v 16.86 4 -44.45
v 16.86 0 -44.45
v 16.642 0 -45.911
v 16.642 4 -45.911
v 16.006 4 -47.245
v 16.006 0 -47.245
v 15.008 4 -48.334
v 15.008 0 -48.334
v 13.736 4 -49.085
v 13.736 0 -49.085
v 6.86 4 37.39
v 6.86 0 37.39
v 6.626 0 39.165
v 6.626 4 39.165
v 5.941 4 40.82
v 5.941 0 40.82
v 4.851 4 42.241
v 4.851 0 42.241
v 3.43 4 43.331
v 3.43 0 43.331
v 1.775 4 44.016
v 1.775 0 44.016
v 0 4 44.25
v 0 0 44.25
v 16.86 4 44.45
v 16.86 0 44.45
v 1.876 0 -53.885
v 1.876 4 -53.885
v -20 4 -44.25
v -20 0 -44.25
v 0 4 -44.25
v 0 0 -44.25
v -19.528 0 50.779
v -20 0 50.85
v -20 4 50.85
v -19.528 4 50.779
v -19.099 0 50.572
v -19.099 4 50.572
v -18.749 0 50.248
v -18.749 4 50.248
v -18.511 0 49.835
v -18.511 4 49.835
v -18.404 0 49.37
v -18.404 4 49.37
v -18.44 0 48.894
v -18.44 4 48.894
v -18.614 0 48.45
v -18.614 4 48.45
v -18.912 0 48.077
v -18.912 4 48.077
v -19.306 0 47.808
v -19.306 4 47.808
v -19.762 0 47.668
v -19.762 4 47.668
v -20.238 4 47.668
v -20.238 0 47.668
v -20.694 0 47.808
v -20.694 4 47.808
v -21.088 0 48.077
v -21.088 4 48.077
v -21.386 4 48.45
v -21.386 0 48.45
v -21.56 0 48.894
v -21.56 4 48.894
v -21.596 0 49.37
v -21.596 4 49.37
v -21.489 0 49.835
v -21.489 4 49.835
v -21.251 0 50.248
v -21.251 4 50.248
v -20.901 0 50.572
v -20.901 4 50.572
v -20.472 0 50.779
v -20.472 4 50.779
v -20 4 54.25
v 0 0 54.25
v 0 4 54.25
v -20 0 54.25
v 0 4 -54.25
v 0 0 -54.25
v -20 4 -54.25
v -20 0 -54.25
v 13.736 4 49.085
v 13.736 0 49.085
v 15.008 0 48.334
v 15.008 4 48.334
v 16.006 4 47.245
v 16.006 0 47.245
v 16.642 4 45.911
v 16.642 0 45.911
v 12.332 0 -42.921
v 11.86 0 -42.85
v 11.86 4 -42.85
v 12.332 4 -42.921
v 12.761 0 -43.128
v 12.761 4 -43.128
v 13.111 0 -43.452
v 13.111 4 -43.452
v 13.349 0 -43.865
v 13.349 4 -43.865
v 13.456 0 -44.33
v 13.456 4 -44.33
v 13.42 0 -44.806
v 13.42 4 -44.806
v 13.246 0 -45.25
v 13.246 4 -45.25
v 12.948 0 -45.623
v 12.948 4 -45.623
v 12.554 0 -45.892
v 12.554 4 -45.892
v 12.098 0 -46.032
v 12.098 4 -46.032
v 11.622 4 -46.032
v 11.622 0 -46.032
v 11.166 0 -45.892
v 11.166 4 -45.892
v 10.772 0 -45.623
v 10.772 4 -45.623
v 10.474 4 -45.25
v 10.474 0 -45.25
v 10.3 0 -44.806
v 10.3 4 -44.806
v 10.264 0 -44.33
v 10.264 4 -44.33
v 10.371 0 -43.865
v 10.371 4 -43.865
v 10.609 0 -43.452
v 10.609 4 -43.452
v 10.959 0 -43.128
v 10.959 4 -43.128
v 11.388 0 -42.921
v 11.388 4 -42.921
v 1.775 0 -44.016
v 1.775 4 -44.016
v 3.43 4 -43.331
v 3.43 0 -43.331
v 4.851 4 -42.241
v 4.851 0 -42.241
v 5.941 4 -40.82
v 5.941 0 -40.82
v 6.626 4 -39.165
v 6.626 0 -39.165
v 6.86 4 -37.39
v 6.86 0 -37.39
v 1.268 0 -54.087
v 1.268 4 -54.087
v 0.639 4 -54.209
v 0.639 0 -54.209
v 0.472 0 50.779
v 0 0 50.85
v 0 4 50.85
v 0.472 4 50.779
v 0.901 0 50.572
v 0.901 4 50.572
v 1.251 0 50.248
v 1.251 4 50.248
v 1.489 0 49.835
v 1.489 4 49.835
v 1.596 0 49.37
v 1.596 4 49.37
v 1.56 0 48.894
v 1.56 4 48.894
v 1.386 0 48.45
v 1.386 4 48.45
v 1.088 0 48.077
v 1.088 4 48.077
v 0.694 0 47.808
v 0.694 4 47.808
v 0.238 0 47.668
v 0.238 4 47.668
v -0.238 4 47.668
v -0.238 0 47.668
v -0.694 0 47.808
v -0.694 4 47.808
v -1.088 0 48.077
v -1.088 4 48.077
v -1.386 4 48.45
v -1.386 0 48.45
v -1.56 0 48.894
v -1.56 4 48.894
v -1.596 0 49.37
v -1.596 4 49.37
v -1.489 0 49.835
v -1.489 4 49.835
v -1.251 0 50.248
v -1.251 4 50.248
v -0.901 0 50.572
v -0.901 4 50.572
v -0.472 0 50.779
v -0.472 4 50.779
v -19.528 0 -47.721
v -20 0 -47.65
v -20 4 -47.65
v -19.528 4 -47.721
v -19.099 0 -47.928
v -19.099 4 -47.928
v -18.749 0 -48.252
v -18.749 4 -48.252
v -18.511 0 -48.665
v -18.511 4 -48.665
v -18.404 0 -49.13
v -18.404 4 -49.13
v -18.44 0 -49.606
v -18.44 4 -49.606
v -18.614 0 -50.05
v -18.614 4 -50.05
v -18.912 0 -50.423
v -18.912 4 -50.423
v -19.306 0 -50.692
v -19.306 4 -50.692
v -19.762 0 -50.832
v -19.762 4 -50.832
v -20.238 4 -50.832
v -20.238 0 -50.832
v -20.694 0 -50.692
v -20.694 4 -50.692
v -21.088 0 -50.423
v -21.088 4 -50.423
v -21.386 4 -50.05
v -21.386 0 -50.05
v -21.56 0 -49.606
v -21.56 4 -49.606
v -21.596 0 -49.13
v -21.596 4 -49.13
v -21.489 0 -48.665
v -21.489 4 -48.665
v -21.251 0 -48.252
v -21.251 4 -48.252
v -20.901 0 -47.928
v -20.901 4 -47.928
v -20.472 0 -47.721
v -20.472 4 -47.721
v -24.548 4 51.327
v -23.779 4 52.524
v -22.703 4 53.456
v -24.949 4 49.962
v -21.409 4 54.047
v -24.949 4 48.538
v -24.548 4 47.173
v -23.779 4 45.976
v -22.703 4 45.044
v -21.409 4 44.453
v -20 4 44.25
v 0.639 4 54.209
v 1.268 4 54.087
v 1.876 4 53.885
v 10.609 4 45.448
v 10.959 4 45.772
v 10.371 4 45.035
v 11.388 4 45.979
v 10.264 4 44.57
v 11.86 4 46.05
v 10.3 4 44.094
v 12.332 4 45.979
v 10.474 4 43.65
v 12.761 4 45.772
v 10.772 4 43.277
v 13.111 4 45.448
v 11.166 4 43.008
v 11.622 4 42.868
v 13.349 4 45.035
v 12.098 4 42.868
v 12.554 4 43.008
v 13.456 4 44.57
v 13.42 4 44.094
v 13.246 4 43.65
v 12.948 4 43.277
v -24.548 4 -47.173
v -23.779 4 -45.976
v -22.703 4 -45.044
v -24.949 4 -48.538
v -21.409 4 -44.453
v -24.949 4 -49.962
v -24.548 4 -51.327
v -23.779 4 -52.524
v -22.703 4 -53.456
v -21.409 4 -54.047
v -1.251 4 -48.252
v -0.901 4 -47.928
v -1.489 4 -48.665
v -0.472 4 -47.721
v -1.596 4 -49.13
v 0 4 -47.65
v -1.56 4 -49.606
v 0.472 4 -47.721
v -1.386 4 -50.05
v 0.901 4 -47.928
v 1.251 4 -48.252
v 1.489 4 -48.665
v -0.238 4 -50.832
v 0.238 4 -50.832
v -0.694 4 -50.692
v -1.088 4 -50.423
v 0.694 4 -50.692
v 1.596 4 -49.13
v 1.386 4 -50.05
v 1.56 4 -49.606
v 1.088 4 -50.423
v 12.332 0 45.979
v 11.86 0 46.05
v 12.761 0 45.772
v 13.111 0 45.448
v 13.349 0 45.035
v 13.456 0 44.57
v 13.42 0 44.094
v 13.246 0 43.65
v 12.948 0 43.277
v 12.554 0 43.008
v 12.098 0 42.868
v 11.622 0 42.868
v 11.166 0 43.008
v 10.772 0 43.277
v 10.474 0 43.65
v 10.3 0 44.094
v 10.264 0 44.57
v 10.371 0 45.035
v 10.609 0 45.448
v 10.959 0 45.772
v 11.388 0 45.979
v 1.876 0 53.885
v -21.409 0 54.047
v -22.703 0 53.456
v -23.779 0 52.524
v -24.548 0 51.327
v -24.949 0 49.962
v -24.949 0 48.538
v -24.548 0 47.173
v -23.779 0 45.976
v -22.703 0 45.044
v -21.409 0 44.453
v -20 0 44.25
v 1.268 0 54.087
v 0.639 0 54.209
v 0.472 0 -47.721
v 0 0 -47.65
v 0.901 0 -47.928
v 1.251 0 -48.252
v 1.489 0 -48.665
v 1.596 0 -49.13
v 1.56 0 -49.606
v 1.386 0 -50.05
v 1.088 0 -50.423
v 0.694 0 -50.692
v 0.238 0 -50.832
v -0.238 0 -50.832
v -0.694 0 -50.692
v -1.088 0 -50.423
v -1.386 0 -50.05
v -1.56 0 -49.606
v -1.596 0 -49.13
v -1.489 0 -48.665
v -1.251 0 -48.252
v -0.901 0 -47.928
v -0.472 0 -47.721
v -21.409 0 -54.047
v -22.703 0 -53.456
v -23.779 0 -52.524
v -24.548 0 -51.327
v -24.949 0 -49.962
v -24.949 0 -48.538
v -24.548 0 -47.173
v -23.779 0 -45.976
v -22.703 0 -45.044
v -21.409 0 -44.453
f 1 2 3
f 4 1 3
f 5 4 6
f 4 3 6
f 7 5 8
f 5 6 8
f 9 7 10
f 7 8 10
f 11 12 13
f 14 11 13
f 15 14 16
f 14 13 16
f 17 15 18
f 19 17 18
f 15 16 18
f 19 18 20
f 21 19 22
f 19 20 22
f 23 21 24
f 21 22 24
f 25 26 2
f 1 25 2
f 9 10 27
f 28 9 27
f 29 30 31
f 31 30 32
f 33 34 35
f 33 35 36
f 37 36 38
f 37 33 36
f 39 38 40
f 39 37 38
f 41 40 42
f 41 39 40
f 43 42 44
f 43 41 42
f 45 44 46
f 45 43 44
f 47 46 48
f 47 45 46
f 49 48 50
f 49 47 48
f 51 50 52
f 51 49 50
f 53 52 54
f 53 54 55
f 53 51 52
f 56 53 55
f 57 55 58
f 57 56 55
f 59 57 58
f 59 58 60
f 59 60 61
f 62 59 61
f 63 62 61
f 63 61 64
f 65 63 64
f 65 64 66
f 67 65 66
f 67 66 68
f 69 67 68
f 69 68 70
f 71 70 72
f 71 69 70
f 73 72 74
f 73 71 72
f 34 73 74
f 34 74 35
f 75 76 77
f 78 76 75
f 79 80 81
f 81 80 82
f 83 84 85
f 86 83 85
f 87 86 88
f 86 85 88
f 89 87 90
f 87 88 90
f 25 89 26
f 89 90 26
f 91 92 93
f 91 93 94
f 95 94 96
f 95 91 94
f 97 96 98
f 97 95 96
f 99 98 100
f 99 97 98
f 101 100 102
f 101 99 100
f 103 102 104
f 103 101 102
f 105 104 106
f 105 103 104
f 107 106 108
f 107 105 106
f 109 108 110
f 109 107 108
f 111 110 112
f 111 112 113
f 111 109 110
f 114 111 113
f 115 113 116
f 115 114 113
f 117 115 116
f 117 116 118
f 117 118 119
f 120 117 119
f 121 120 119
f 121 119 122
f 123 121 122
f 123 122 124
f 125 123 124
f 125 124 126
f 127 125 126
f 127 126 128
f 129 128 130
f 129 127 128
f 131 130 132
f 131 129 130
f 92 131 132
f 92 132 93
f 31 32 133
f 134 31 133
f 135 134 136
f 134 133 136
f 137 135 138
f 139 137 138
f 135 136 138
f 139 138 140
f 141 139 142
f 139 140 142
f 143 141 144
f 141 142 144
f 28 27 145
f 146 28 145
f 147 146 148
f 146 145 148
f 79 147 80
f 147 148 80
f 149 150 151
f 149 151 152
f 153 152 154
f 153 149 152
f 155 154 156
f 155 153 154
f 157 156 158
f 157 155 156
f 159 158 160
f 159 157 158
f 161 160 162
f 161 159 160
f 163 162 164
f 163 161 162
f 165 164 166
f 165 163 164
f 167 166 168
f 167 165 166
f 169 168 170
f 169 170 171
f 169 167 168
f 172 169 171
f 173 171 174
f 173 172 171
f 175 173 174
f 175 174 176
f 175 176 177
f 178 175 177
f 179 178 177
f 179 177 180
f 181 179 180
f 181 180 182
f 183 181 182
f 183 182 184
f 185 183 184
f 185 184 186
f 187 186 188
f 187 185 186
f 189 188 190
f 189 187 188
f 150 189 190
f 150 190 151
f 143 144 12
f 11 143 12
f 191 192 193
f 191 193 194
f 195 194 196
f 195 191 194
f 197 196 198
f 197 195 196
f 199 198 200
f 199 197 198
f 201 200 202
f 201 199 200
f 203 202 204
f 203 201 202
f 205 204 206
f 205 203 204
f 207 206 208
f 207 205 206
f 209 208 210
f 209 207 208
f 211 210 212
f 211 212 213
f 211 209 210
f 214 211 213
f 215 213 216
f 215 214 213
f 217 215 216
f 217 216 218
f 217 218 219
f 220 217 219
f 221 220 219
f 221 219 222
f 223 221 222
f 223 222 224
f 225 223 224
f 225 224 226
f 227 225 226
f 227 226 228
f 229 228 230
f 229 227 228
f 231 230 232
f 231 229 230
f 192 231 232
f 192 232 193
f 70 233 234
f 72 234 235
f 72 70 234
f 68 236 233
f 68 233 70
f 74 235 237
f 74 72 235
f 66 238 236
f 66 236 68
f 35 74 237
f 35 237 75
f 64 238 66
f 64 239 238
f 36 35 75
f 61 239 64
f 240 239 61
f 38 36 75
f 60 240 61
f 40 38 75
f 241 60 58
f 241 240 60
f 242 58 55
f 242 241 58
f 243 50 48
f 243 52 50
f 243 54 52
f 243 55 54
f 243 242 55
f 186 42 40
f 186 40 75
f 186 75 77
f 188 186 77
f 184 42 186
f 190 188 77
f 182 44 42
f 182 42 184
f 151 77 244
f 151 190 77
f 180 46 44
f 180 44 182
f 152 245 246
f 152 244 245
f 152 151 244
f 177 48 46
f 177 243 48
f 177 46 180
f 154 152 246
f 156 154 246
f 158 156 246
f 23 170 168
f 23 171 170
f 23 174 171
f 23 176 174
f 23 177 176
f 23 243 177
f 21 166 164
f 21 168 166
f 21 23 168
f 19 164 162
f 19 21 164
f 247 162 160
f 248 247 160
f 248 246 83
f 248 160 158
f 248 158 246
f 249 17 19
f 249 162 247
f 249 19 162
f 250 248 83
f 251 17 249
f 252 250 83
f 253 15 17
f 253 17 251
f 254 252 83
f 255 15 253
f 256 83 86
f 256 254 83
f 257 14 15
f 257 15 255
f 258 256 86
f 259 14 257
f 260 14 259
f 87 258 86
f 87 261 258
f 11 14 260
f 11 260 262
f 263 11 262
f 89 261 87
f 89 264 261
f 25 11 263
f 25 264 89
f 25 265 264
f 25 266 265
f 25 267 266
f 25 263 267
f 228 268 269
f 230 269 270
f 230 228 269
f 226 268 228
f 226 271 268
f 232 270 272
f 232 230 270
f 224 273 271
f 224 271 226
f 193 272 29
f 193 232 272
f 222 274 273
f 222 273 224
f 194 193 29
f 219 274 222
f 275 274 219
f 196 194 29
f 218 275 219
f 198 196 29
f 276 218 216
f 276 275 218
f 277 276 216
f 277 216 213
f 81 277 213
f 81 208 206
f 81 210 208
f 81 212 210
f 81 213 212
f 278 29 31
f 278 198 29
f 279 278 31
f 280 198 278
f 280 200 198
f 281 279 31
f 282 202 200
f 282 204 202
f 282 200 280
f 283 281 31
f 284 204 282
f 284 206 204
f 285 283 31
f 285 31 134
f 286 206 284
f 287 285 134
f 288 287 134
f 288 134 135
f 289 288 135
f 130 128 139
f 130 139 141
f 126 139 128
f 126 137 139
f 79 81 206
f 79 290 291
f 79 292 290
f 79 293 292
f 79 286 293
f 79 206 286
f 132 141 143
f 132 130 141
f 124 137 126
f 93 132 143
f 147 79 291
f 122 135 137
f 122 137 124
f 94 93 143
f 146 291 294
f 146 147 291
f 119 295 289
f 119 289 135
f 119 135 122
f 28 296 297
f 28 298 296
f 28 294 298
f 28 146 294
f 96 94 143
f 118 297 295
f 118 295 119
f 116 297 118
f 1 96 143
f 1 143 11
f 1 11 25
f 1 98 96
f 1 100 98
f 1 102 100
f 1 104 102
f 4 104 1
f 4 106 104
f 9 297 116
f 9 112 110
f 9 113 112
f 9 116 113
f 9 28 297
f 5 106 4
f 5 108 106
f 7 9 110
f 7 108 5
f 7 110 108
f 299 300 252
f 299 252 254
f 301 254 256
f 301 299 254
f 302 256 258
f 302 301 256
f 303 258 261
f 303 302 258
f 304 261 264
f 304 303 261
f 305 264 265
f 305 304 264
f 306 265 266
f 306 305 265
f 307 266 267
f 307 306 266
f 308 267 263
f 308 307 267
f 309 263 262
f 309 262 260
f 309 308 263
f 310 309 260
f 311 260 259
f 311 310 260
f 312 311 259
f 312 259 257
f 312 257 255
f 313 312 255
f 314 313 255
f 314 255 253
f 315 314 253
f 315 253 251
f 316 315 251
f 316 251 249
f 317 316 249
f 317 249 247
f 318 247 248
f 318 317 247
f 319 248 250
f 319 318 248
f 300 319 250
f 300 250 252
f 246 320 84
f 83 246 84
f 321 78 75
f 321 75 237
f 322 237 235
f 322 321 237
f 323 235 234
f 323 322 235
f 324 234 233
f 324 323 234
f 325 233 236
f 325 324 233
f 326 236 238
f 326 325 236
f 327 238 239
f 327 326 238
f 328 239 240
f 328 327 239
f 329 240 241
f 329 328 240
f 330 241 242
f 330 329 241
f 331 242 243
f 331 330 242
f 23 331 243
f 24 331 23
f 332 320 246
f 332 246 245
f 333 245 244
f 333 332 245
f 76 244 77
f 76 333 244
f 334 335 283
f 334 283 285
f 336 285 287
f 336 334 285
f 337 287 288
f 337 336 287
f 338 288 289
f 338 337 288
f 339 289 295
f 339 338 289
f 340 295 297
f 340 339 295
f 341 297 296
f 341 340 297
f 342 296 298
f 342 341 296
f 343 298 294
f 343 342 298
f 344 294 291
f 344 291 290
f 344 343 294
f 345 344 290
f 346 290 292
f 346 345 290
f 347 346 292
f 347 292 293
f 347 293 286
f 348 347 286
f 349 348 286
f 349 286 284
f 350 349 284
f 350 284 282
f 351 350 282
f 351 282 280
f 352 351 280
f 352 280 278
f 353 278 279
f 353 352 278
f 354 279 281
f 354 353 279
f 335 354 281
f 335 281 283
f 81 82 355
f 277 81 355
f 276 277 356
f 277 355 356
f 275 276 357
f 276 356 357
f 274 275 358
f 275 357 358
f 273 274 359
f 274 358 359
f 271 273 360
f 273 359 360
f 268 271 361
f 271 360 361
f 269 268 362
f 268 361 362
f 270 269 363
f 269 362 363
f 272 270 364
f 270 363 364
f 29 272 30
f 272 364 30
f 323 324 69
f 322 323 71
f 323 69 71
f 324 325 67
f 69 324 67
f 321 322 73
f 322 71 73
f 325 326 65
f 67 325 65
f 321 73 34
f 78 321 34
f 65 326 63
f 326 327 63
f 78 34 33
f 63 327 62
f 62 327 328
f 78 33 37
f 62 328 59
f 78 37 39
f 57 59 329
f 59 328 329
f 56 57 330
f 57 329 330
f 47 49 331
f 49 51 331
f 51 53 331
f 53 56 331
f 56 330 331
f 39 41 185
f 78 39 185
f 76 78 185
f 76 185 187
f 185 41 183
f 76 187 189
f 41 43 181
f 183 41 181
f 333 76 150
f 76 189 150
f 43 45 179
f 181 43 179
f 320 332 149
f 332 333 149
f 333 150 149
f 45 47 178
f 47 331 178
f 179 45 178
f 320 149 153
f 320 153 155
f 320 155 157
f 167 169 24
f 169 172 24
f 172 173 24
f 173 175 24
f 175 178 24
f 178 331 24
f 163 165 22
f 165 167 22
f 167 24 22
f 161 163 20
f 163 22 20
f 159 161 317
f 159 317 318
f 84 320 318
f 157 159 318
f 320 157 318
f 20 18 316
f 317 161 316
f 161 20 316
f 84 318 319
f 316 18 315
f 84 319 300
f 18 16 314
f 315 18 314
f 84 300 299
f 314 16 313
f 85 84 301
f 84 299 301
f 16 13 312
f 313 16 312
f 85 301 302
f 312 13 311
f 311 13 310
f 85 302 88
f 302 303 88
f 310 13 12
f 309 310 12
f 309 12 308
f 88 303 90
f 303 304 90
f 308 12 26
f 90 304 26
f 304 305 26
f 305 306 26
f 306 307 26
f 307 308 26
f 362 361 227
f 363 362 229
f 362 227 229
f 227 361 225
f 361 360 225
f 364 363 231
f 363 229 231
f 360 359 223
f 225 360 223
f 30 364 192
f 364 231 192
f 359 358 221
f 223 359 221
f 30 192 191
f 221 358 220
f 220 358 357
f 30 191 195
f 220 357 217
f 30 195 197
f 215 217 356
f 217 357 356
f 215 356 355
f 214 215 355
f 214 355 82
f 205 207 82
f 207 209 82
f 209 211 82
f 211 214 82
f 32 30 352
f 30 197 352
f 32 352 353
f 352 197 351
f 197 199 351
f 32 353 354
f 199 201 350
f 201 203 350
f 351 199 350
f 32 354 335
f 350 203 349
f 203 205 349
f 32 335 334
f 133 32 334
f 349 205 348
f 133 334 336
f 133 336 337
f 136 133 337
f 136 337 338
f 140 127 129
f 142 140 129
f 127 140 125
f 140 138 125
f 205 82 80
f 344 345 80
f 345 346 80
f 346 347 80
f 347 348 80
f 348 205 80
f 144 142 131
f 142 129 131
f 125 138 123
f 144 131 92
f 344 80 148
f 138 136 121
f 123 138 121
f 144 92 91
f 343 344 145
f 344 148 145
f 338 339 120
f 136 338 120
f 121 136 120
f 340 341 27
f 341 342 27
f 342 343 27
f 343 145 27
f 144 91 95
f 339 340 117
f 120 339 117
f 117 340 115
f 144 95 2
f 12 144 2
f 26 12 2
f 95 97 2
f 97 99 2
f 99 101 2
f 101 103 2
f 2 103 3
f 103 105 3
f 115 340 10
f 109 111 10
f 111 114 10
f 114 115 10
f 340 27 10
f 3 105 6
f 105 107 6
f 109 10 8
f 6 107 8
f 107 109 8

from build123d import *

# Parameters (mm, degrees)
SKETCH1_R           = 1.6
BOSS_EXTRUDE1_DEPTH = 4


with BuildPart() as part:
    # Sketch1 → Boss-Extrude1 (new body)
    # profile 1 of 5: a face of its own
    with BuildSketch(Plane(origin=(0, 0, 0), x_dir=(1, 0, 0), z_dir=(0, 1, 0))):
        with BuildLine():
            Line((-20, 44.25), (0, 44.25))
            ThreePointArc((0, 44.25), (5, 49.25), (0, 54.25))
            Line((0, 54.25), (-20, 54.25))
            ThreePointArc((-20, 54.25), (-25, 49.25), (-20, 44.25))
        make_face()
        with Locations(Location((0, 49.25, 0), (0, 0, 270))):
            Circle(SKETCH1_R, mode=Mode.SUBTRACT)
        with Locations(Location((-20, 49.25, 0), (0, 0, 270))):
            Circle(SKETCH1_R, mode=Mode.SUBTRACT)
    # profile 2 of 5: a face of its own
    with BuildSketch(Plane(origin=(0, 0, 0), x_dir=(1, 0, 0), z_dir=(0, 1, 0))):
        with BuildLine():
            Line((13.735803892, 49.084798783), (1.875803892, 53.884798783))
            ThreePointArc((1.875803892, 53.884798783), (4.907850544, 48.294488073), (0, 44.25))
            ThreePointArc((0, 44.25), (4.850752519, 42.240752519), (6.86, 37.39))
            Line((6.86, 37.39), (6.86, 44.45))
            ThreePointArc((6.86, 44.45), (9.065274563, 48.596023363), (13.735803892, 49.084798783))
        make_face()
    # profile 3 of 5: a face of its own
    with BuildSketch(Plane(origin=(0, 0, 0), x_dir=(1, 0, 0), z_dir=(0, 1, 0))):
        with BuildLine():
            ThreePointArc((6.86, -44.45), (11.86, -49.45), (16.86, -44.45))
            Line((16.86, -44.45), (16.86, 44.45))
            ThreePointArc((16.86, 44.45), (11.86, 49.45), (6.86, 44.45))
            Line((6.86, 44.45), (6.86, -44.45))
        make_face()
        with Locations(Location((11.86, -44.45, 0), (0, 0, 270))):
            Circle(SKETCH1_R, mode=Mode.SUBTRACT)
        with Locations(Location((11.86, 44.45, 0), (0, 0, 270))):
            Circle(SKETCH1_R, mode=Mode.SUBTRACT)
    # profile 4 of 5: a face of its own
    with BuildSketch(Plane(origin=(0, 0, 0), x_dir=(1, 0, 0), z_dir=(0, 1, 0))):
        with BuildLine():
            ThreePointArc((0, -44.25), (5, -49.25), (0, -54.25))
            Line((0, -54.25), (-20, -54.25))
            ThreePointArc((-20, -54.25), (-25, -49.25), (-20, -44.25))
            Line((-20, -44.25), (0, -44.25))
        make_face()
        with Locations(Location((-20, -49.25, 0), (0, 0, 270))):
            Circle(SKETCH1_R, mode=Mode.SUBTRACT)
        with Locations(Location((0, -49.25, 0), (0, 0, 270))):
            Circle(SKETCH1_R, mode=Mode.SUBTRACT)
    # profile 5 of 5: a face of its own
    with BuildSketch(Plane(origin=(0, 0, 0), x_dir=(1, 0, 0), z_dir=(0, 1, 0))):
        with BuildLine():
            Line((6.86, -44.45), (6.86, -37.39))
            ThreePointArc((6.86, -37.39), (4.850752519, -42.240752519), (0, -44.25))
            ThreePointArc((0, -44.25), (4.907850544, -48.294488073), (1.875803892, -53.884798783))
            Line((1.875803892, -53.884798783), (13.735803892, -49.084798783))
            ThreePointArc((13.735803892, -49.084798783), (9.065274563, -48.596023363), (6.86, -44.45))
        make_face()
    extrude(amount=BOSS_EXTRUDE1_DEPTH)


solid = part.part
